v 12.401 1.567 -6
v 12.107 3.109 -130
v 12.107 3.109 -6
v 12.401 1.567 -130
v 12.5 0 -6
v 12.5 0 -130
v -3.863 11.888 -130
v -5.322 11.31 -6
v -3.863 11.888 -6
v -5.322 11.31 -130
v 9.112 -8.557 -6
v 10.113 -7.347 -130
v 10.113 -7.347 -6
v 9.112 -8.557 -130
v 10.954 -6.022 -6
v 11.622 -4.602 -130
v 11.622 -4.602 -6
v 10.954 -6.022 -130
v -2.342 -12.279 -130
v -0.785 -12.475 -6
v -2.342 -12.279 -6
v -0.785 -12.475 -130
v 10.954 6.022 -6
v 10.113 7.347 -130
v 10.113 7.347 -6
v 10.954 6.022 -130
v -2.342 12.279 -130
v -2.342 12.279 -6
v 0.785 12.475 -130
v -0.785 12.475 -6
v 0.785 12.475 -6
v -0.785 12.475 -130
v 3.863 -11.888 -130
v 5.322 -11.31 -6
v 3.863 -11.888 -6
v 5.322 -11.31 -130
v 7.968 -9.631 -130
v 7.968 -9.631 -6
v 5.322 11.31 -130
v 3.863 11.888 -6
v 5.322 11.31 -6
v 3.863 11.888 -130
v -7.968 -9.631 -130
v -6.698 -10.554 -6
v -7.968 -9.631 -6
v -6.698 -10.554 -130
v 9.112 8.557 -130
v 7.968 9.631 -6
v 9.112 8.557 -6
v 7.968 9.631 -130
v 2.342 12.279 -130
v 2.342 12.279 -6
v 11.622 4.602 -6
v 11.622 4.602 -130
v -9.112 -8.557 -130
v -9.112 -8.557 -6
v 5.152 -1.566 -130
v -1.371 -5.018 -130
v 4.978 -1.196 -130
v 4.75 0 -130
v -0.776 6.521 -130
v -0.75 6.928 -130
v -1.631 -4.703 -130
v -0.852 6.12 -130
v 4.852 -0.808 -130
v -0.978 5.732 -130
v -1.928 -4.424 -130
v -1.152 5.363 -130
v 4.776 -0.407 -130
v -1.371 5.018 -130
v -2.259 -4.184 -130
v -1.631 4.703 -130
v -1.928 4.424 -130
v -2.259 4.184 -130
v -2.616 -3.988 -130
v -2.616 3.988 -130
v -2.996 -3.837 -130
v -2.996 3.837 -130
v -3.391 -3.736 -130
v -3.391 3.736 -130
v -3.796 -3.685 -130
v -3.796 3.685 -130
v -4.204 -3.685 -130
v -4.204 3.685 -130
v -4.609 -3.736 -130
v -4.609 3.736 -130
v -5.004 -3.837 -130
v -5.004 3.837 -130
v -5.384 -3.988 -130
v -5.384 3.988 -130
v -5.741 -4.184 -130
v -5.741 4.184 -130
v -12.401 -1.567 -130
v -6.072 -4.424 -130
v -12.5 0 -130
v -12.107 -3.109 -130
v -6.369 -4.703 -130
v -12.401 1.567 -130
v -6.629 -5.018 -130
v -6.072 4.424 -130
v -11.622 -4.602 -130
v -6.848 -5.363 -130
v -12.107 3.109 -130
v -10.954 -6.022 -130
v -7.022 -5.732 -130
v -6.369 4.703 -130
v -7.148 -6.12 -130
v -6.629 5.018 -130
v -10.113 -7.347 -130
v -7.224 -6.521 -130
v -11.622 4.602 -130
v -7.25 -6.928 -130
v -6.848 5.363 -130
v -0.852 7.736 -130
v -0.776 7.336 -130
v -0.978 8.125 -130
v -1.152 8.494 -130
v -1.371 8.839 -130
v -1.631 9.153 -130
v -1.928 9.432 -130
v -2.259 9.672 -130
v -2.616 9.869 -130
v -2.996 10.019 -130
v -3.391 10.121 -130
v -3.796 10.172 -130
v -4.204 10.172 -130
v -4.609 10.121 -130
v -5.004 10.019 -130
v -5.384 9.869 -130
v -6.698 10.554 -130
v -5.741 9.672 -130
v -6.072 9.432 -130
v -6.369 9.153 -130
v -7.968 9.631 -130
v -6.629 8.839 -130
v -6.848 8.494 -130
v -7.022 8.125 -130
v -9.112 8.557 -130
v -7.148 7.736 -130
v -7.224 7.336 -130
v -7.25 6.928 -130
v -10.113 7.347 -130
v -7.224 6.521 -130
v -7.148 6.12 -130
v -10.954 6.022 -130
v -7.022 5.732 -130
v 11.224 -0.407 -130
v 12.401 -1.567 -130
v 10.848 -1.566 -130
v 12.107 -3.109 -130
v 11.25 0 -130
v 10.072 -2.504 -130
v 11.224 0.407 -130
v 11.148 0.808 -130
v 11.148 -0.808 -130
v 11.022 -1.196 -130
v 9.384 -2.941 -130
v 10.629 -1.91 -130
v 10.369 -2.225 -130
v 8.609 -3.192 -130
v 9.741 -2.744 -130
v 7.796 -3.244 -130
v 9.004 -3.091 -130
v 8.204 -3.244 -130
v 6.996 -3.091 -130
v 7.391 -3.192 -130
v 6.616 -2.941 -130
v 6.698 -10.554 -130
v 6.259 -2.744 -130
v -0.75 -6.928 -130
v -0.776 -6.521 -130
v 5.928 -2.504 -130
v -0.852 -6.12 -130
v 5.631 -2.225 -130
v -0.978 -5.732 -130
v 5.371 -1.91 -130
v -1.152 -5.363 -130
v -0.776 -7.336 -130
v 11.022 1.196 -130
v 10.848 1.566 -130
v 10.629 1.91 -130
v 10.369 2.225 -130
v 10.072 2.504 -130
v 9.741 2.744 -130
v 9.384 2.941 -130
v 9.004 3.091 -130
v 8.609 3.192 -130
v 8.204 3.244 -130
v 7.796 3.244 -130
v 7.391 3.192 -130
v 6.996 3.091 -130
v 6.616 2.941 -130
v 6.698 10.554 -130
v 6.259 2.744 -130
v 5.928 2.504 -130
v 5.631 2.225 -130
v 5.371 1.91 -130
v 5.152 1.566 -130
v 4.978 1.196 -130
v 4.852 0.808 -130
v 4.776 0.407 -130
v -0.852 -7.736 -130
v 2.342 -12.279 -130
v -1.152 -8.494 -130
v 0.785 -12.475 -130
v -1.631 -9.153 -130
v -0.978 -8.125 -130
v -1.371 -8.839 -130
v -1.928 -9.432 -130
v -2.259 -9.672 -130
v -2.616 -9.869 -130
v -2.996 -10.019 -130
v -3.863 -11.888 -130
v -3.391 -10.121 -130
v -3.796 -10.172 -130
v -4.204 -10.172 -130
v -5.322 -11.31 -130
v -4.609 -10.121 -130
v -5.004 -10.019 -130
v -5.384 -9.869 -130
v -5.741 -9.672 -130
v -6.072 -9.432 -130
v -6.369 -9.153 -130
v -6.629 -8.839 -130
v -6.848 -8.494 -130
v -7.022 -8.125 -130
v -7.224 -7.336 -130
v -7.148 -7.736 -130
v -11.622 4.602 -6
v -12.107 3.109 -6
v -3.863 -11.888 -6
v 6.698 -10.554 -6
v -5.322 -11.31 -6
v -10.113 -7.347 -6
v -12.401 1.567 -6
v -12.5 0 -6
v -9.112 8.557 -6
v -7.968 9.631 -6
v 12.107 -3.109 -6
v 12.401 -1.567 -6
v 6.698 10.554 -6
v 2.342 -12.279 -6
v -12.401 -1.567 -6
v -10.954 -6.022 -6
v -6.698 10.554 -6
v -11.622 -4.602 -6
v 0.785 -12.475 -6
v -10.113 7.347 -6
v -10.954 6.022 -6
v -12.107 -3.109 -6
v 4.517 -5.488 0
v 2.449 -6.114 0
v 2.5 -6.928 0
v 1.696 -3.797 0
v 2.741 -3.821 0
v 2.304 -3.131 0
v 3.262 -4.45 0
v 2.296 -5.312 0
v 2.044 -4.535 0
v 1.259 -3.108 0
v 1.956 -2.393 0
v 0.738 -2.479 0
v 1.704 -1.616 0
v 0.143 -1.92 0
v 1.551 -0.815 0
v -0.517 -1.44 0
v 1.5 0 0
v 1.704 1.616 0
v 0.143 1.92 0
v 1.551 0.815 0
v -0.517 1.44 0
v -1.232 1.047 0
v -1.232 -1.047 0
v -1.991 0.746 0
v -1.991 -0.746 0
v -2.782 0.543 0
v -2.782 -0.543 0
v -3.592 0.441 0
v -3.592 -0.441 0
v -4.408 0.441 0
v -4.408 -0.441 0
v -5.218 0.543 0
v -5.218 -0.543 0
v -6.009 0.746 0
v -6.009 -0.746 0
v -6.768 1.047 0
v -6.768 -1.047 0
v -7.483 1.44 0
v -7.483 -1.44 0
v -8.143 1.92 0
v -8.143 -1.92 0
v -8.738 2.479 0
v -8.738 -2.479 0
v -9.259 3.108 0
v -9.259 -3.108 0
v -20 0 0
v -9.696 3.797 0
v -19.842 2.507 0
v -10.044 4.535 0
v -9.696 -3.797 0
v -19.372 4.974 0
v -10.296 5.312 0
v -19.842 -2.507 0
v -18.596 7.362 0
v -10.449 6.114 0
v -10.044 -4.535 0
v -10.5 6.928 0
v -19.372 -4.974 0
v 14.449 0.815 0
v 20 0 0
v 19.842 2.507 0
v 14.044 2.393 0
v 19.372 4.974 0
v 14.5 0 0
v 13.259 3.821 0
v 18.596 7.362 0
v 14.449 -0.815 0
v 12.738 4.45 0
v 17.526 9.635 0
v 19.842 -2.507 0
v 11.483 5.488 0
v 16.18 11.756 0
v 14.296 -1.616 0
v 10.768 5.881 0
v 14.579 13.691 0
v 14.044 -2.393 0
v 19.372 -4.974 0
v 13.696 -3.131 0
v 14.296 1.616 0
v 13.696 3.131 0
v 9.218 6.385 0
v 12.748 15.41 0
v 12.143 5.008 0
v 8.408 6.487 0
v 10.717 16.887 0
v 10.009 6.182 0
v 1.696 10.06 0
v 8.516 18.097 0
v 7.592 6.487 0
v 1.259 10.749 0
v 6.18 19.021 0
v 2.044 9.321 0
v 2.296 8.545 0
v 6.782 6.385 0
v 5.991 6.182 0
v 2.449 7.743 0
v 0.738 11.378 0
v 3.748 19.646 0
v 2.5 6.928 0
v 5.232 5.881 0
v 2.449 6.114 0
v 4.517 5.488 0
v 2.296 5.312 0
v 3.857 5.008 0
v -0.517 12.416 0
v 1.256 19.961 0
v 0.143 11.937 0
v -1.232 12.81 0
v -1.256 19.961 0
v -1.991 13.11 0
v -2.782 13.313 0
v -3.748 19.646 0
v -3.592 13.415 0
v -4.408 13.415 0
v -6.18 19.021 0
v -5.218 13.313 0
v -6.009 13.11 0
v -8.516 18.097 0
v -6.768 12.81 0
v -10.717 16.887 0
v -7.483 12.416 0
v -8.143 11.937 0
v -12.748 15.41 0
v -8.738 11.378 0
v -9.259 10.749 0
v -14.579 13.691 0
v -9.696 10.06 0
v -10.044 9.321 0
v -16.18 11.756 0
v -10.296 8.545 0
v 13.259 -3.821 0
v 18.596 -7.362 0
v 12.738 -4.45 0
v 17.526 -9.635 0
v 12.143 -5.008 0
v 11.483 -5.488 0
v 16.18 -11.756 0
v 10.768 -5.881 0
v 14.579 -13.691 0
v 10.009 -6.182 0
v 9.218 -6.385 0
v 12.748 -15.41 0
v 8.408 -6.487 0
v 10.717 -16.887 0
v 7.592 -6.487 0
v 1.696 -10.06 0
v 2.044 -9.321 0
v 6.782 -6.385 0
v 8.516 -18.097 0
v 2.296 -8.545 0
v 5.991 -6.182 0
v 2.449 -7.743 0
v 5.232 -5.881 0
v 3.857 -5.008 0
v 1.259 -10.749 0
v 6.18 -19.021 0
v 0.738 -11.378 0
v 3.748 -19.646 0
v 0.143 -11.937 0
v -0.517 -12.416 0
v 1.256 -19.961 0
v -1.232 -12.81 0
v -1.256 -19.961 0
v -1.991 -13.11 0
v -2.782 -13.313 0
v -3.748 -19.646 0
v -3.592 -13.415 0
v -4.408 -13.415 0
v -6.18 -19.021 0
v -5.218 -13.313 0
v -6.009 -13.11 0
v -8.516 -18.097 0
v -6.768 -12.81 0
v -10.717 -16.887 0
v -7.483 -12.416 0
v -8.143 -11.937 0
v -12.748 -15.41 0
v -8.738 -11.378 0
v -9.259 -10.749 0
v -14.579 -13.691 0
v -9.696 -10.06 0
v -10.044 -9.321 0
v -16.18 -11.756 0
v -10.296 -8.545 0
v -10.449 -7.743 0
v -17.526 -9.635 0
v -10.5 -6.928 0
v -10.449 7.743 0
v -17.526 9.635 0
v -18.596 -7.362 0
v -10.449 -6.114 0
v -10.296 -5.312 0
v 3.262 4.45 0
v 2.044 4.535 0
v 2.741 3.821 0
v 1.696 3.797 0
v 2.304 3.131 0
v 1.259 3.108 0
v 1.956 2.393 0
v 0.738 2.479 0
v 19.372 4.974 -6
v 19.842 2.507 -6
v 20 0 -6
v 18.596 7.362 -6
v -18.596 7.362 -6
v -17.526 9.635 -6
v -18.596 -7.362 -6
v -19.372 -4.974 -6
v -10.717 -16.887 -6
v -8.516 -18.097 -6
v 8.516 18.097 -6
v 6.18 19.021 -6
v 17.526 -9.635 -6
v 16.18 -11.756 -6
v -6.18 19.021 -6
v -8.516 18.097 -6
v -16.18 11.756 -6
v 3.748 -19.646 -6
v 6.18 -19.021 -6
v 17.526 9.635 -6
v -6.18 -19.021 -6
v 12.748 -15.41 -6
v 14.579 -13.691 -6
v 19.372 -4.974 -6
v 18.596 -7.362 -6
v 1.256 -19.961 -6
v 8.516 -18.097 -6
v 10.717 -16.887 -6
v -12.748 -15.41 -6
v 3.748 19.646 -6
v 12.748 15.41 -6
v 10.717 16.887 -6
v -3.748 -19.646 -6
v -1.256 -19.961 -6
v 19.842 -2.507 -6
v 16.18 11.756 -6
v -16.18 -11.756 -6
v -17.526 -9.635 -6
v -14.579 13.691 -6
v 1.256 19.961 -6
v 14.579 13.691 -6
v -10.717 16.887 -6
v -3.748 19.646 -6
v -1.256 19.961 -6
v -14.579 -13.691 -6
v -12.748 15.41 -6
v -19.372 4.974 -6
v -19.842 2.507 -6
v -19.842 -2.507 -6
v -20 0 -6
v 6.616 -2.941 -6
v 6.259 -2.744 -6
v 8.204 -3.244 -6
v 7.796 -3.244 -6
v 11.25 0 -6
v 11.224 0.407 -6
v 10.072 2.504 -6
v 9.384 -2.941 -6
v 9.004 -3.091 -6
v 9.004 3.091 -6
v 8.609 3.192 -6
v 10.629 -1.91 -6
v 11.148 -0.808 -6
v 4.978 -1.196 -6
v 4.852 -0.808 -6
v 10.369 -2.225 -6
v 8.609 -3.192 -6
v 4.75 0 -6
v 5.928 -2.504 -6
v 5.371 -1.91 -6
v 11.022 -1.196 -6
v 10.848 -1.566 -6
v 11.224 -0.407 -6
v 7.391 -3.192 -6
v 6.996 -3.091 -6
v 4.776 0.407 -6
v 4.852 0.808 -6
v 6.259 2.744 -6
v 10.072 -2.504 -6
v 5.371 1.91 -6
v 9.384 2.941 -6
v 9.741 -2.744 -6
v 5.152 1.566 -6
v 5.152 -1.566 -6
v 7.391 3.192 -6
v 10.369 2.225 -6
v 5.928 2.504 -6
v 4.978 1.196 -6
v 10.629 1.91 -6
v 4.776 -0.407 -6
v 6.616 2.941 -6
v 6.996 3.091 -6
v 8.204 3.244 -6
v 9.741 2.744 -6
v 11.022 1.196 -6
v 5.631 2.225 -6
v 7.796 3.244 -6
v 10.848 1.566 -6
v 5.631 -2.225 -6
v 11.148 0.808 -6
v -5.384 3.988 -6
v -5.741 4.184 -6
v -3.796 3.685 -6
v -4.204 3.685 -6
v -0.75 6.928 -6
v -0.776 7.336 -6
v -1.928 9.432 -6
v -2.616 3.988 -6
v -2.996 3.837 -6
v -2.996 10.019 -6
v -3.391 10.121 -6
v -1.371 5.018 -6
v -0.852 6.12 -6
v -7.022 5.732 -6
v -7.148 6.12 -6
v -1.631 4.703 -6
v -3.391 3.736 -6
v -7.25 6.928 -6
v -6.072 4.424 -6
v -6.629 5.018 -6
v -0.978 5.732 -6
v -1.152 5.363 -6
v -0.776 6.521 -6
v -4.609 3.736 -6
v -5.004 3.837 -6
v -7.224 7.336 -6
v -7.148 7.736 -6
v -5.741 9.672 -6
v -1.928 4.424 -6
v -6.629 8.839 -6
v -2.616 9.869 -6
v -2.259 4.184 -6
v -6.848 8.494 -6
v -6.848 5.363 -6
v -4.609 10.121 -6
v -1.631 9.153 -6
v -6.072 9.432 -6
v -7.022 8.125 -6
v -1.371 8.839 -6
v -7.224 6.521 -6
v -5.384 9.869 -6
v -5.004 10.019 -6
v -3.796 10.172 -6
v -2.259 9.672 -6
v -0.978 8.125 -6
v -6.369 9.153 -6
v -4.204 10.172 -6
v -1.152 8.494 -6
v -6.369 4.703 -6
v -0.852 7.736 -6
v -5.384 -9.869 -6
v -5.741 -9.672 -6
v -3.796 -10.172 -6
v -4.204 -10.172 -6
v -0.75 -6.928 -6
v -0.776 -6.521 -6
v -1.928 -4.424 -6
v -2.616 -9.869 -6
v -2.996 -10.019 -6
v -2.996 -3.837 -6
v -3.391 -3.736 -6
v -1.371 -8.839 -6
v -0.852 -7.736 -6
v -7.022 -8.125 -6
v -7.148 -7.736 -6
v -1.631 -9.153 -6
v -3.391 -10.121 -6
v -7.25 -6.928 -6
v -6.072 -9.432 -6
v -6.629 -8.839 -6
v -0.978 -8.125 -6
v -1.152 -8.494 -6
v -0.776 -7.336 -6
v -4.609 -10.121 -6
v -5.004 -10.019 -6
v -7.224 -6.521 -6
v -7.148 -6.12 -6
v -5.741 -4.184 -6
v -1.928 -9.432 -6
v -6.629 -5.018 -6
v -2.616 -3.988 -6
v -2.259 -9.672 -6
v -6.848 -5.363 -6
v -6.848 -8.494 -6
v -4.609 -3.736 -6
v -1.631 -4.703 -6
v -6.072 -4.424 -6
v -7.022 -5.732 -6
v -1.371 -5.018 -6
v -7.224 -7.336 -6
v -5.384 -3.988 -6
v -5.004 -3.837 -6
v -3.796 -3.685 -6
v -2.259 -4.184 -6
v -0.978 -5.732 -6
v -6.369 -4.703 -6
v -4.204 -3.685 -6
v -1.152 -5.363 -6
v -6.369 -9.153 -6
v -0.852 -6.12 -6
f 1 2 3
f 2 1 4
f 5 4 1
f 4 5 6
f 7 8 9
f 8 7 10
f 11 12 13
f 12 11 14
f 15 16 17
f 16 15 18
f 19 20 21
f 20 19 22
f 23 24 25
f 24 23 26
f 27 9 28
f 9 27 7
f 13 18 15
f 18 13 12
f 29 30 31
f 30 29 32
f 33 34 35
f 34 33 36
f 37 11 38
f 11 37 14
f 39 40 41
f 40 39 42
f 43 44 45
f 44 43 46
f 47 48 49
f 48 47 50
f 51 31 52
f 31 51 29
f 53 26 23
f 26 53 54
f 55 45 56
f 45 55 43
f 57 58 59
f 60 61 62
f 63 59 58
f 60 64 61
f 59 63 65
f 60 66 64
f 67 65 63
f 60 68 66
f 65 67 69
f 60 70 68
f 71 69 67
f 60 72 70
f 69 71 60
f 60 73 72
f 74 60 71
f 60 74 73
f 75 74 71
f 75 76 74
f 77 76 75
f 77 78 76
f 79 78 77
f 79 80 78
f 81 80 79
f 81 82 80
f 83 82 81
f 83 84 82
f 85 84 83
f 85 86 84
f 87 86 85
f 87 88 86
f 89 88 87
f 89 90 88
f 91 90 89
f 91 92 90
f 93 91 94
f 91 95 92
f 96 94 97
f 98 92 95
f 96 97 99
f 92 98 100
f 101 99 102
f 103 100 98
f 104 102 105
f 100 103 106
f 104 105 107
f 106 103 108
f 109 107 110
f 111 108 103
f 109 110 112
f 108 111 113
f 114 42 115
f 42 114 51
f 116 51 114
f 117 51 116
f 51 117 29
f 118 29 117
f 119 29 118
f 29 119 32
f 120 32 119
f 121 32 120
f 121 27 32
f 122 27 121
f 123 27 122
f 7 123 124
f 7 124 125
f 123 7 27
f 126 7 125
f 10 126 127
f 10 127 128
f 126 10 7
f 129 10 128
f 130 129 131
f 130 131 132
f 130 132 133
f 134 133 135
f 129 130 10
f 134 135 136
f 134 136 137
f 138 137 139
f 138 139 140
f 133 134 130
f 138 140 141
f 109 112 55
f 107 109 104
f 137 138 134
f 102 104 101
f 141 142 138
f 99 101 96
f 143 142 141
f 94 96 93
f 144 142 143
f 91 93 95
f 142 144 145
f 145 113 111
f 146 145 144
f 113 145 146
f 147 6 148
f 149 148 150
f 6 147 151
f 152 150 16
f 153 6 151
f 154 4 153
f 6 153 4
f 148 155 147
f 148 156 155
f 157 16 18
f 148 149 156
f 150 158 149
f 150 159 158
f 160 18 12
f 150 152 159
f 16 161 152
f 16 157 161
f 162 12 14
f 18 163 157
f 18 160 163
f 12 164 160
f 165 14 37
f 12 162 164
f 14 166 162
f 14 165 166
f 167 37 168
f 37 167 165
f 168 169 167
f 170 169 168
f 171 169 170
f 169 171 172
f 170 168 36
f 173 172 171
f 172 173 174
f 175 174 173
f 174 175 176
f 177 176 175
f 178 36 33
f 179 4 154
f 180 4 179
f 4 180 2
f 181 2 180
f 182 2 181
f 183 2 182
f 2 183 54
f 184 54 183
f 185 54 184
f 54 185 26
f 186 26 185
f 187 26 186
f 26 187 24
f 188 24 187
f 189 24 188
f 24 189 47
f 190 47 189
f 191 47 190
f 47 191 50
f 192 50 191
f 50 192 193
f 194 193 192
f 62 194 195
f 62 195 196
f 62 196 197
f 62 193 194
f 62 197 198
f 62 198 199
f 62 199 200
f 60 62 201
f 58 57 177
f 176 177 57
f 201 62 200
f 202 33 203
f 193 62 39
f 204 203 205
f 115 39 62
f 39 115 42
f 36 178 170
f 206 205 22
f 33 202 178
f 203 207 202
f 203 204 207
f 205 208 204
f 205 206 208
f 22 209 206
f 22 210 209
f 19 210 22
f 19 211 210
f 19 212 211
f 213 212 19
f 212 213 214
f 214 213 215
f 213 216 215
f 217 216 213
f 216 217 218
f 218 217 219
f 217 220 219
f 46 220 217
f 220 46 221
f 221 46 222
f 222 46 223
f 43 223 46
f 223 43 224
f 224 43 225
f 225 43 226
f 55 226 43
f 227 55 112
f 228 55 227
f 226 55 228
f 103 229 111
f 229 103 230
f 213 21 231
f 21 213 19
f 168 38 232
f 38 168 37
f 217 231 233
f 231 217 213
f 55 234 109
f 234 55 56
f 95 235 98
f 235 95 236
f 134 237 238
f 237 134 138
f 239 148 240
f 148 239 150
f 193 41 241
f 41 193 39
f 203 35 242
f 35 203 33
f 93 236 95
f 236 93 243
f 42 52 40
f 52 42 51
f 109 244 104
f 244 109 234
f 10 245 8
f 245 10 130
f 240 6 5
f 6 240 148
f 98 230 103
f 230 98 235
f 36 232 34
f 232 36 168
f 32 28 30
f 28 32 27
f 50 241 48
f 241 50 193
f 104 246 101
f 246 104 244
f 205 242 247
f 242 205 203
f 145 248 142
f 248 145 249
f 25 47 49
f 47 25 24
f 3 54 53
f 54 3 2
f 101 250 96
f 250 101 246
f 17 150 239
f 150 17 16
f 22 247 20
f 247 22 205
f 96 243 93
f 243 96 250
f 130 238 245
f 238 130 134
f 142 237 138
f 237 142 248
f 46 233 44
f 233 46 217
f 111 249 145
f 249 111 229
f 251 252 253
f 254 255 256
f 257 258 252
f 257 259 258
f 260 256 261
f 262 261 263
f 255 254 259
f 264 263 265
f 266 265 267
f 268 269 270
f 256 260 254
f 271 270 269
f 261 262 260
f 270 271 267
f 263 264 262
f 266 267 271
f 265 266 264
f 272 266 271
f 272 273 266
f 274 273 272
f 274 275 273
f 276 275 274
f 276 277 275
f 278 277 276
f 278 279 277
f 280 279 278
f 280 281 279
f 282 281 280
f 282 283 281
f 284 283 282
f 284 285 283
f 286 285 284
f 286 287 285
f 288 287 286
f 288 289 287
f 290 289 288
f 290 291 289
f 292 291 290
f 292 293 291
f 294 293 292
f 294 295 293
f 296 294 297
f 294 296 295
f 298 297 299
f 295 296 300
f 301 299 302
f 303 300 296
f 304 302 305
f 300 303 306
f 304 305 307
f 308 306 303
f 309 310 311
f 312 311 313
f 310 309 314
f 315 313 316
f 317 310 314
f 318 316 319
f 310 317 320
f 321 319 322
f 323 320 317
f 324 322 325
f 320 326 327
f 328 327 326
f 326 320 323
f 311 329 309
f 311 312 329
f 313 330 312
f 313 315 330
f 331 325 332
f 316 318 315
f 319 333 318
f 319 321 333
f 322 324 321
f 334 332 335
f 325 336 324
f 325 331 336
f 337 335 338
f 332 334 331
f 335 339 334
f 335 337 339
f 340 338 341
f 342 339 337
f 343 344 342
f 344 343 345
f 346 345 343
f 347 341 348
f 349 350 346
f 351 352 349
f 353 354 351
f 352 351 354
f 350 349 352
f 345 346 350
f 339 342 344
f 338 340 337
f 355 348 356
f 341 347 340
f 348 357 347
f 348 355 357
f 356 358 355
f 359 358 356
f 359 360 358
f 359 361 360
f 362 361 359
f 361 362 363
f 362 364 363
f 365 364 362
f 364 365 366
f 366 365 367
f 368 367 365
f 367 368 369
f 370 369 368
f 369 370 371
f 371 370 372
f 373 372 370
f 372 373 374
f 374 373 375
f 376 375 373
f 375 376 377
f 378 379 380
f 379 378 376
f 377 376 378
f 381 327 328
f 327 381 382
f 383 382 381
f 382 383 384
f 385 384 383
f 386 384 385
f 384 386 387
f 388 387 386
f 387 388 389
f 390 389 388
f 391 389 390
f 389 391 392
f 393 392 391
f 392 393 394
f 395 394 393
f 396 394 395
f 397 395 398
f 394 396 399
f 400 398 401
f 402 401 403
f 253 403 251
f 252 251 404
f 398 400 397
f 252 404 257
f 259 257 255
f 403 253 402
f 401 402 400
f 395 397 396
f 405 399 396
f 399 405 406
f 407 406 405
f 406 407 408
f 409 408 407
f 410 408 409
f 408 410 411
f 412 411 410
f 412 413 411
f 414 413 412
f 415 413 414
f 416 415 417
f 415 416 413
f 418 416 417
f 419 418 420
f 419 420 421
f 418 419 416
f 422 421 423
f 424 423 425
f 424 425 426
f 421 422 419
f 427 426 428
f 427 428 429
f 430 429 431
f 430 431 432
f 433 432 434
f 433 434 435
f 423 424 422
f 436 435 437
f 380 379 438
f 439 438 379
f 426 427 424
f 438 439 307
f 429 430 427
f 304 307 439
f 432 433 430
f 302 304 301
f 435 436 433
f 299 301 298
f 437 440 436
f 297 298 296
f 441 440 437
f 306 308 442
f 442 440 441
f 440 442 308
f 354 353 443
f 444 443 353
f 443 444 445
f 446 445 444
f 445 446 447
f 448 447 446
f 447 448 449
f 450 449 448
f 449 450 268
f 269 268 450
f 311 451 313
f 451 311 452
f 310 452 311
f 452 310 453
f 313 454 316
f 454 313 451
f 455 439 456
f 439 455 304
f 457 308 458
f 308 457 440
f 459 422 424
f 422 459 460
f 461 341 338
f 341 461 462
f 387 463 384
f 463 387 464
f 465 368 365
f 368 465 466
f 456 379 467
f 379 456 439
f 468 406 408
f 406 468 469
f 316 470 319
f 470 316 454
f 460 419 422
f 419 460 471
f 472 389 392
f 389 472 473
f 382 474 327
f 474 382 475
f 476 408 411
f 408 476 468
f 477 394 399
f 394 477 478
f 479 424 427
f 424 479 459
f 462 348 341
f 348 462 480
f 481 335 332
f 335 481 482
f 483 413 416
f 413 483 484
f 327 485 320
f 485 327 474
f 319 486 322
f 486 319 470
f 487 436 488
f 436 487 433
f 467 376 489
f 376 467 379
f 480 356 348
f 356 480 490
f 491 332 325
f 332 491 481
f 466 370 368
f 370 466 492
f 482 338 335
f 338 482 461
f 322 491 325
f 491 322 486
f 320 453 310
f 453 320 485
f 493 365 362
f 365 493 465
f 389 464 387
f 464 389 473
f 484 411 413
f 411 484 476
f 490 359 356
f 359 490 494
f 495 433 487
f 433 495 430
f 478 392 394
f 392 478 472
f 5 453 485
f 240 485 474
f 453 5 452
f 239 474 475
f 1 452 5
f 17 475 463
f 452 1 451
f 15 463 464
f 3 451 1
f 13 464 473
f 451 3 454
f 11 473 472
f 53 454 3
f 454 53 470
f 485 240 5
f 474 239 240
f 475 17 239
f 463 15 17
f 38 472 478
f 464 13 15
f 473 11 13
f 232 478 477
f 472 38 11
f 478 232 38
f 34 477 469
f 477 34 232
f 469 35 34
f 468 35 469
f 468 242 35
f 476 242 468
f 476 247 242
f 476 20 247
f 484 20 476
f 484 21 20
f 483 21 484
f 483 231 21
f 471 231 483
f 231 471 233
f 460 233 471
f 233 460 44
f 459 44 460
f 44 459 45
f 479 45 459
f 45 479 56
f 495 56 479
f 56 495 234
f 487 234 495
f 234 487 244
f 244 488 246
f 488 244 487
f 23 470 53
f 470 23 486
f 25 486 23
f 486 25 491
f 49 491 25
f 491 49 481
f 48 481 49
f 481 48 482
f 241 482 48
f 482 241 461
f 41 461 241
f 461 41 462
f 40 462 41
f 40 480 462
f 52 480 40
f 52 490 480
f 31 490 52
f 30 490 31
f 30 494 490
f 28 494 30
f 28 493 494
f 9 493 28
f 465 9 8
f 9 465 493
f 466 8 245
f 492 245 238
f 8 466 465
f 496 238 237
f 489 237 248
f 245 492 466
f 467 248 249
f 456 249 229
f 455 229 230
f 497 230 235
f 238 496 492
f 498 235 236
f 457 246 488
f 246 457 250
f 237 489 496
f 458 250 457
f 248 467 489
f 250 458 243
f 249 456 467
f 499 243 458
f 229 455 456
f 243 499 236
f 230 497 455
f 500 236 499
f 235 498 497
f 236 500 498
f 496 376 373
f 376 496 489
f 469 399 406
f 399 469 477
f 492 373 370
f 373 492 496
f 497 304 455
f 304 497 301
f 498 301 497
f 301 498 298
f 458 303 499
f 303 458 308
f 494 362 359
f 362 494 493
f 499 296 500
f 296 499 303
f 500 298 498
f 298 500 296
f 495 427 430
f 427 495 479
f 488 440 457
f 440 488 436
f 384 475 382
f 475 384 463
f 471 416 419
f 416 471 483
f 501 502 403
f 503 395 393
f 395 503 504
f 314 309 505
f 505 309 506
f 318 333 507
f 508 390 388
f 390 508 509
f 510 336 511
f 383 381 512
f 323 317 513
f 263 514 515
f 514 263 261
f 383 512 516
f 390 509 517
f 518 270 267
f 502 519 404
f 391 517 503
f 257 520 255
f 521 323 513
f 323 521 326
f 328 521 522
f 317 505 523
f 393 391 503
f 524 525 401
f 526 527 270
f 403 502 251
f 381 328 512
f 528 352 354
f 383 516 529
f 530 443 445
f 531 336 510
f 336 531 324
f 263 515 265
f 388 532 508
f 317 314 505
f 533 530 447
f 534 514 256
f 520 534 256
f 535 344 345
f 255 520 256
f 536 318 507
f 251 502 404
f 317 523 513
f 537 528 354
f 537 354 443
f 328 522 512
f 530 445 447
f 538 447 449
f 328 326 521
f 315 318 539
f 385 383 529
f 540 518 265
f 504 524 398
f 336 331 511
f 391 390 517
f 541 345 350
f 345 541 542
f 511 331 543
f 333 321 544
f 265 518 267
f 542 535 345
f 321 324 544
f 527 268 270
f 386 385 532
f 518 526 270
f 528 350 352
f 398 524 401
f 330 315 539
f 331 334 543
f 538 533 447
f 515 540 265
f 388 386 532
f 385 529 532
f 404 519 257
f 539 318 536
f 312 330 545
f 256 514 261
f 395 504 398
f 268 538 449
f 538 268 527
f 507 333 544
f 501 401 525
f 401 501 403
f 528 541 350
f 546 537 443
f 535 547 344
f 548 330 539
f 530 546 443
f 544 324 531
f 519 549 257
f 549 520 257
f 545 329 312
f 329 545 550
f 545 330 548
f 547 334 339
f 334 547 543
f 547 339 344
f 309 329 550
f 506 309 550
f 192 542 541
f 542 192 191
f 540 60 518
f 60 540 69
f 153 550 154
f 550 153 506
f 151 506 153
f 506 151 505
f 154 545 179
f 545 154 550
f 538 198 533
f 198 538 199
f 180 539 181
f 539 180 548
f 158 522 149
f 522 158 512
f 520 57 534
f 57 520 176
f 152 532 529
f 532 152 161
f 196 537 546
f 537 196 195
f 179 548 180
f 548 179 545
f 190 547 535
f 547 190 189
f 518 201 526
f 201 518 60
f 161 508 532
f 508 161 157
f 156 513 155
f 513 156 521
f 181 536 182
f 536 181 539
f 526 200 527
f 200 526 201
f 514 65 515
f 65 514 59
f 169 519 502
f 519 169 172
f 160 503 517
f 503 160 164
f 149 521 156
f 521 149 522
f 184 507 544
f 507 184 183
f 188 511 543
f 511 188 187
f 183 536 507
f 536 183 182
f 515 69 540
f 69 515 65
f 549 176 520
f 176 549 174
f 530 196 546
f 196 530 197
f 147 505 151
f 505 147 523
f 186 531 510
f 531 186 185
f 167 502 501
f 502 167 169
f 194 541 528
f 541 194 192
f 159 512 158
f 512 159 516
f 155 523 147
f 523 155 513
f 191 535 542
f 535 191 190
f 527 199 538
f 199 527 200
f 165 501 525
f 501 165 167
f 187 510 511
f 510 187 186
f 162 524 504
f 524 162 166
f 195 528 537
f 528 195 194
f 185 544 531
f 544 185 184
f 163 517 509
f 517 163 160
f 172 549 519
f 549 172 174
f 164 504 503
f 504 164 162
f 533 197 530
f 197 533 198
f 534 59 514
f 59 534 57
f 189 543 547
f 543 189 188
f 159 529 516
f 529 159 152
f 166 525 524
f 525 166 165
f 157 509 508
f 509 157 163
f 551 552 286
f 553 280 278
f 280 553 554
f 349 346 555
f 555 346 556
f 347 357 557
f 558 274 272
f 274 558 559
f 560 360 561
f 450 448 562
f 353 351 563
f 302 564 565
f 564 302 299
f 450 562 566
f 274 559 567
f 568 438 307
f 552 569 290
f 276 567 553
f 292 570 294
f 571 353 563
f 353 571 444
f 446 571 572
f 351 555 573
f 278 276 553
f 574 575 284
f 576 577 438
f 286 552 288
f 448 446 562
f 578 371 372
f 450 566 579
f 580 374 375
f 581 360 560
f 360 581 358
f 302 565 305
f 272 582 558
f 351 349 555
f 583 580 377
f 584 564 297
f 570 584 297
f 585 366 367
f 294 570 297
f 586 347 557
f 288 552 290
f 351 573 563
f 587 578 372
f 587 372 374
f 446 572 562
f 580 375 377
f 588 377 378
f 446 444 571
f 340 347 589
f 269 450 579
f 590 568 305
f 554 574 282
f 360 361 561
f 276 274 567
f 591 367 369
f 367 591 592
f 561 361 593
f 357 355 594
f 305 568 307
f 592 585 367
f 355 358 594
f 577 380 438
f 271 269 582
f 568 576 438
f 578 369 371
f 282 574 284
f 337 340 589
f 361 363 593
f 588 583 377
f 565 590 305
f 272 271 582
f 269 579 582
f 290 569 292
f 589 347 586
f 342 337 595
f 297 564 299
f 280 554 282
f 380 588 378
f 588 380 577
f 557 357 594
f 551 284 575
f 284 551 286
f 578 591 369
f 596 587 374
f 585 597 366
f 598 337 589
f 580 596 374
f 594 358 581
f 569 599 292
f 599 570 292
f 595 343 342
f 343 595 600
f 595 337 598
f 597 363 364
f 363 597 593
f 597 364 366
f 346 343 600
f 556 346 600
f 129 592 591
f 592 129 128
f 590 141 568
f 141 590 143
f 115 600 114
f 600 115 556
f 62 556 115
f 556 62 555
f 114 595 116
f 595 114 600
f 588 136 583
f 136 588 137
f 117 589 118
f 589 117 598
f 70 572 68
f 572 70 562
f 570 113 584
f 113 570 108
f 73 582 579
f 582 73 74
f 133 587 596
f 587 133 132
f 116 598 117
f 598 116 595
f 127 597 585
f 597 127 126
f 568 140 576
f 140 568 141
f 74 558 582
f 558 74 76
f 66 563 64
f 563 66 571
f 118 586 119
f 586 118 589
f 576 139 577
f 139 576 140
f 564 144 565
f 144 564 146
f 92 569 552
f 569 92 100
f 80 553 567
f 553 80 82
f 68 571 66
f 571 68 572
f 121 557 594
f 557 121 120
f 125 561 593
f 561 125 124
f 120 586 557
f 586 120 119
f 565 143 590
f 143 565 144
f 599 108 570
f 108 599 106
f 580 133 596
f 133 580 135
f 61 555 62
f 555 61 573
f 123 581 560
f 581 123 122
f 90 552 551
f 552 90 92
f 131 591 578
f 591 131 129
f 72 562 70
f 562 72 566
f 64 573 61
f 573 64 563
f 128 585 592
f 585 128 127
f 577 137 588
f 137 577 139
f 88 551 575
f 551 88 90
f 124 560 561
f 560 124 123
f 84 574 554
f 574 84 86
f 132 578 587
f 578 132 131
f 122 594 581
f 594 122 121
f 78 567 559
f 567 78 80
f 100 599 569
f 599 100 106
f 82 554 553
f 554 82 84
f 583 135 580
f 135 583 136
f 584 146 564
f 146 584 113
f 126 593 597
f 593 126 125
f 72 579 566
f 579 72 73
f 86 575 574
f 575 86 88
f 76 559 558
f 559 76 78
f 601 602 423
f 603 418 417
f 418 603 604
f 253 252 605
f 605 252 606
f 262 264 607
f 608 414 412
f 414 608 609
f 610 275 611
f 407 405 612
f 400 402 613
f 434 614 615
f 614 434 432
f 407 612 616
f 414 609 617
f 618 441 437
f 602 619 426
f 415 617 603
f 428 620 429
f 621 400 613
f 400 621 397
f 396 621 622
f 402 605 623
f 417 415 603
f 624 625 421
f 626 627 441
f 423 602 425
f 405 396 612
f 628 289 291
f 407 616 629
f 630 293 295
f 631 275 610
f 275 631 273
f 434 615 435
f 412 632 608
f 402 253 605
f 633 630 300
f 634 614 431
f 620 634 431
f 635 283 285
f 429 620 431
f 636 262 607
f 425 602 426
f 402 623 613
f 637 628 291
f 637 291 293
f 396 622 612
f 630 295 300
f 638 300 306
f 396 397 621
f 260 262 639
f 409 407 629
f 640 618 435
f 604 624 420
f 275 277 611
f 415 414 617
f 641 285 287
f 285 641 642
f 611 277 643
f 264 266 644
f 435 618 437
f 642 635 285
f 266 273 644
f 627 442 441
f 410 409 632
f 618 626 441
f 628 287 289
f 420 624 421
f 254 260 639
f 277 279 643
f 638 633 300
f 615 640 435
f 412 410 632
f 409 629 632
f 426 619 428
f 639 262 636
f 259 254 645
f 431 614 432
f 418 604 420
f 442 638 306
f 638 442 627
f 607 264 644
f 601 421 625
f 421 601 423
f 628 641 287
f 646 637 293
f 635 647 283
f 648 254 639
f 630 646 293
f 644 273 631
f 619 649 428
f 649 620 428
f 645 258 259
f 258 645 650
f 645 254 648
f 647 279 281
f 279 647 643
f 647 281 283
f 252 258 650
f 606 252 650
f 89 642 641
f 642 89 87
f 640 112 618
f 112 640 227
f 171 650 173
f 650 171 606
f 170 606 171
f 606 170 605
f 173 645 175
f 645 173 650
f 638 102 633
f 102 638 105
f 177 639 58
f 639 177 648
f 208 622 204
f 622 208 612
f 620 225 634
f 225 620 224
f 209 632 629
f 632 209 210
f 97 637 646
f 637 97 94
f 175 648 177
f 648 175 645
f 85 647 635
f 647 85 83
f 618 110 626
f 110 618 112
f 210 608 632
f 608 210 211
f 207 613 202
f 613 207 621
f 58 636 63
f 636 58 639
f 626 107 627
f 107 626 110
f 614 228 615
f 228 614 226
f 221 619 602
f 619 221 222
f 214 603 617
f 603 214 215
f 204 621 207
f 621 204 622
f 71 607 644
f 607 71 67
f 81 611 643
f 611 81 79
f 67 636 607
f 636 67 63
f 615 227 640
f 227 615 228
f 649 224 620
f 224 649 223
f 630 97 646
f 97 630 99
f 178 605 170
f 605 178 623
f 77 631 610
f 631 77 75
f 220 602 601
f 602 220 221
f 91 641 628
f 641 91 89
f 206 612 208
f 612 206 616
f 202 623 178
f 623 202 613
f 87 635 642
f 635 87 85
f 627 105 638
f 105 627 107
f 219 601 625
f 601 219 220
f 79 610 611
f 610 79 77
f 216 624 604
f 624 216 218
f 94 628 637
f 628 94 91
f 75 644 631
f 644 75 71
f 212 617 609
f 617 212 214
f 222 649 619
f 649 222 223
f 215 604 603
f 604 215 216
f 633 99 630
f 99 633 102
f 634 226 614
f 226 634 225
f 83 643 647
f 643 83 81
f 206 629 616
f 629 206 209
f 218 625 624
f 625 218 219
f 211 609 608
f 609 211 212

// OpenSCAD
$fn = 50;


difference() {
	union() {
		translate(v = [0, 0, -130.0000000000]) {
			cylinder(h = 130, r = 12.5000000000);
		}
		translate(v = [0, 0, -6.0000000000]) {
			cylinder(h = 6, r = 20.0000000000);
		}
	}
	union() {
		translate(v = [8.0000000000, 0.0000000000, 0]) {
			rotate(a = [0, 0, 0]) {
				difference() {
					union() {
						#translate(v = [0, 0, -130.0000000000]) {
							cylinder(h = 130, r = 2.2500000000);
						}
						#translate(v = [0, 0, -6]) {
							cylinder(h = 6, r = 12.5000000000, r1 = 3.2500000000, r2 = 6.5000000000);
						}
						#translate(v = [0, 0, -130.0000000000]) {
							cylinder(h = 130, r = 3.2500000000);
						}
						#translate(v = [0, 0, -130.0000000000]) {
							cylinder(h = 130, r = 2.2500000000);
						}
					}
					union();
				}
			}
		}
		translate(v = [-4.0000000000, 6.9282032303, 0]) {
			rotate(a = [0, 0, 0]) {
				difference() {
					union() {
						#translate(v = [0, 0, -130.0000000000]) {
							cylinder(h = 130, r = 2.2500000000);
						}
						#translate(v = [0, 0, -6]) {
							cylinder(h = 6, r = 12.5000000000, r1 = 3.2500000000, r2 = 6.5000000000);
						}
						#translate(v = [0, 0, -130.0000000000]) {
							cylinder(h = 130, r = 3.2500000000);
						}
						#translate(v = [0, 0, -130.0000000000]) {
							cylinder(h = 130, r = 2.2500000000);
						}
					}
					union();
				}
			}
		}
		translate(v = [-4.0000000000, -6.9282032303, 0]) {
			rotate(a = [0, 0, 0]) {
				difference() {
					union() {
						#translate(v = [0, 0, -130.0000000000]) {
							cylinder(h = 130, r = 2.2500000000);
						}
						#translate(v = [0, 0, -6]) {
							cylinder(h = 6, r = 12.5000000000, r1 = 3.2500000000, r2 = 6.5000000000);
						}
						#translate(v = [0, 0, -130.0000000000]) {
							cylinder(h = 130, r = 3.2500000000);
						}
						#translate(v = [0, 0, -130.0000000000]) {
							cylinder(h = 130, r = 2.2500000000);
						}
					}
					union();
				}
			}
		}
	}
}
